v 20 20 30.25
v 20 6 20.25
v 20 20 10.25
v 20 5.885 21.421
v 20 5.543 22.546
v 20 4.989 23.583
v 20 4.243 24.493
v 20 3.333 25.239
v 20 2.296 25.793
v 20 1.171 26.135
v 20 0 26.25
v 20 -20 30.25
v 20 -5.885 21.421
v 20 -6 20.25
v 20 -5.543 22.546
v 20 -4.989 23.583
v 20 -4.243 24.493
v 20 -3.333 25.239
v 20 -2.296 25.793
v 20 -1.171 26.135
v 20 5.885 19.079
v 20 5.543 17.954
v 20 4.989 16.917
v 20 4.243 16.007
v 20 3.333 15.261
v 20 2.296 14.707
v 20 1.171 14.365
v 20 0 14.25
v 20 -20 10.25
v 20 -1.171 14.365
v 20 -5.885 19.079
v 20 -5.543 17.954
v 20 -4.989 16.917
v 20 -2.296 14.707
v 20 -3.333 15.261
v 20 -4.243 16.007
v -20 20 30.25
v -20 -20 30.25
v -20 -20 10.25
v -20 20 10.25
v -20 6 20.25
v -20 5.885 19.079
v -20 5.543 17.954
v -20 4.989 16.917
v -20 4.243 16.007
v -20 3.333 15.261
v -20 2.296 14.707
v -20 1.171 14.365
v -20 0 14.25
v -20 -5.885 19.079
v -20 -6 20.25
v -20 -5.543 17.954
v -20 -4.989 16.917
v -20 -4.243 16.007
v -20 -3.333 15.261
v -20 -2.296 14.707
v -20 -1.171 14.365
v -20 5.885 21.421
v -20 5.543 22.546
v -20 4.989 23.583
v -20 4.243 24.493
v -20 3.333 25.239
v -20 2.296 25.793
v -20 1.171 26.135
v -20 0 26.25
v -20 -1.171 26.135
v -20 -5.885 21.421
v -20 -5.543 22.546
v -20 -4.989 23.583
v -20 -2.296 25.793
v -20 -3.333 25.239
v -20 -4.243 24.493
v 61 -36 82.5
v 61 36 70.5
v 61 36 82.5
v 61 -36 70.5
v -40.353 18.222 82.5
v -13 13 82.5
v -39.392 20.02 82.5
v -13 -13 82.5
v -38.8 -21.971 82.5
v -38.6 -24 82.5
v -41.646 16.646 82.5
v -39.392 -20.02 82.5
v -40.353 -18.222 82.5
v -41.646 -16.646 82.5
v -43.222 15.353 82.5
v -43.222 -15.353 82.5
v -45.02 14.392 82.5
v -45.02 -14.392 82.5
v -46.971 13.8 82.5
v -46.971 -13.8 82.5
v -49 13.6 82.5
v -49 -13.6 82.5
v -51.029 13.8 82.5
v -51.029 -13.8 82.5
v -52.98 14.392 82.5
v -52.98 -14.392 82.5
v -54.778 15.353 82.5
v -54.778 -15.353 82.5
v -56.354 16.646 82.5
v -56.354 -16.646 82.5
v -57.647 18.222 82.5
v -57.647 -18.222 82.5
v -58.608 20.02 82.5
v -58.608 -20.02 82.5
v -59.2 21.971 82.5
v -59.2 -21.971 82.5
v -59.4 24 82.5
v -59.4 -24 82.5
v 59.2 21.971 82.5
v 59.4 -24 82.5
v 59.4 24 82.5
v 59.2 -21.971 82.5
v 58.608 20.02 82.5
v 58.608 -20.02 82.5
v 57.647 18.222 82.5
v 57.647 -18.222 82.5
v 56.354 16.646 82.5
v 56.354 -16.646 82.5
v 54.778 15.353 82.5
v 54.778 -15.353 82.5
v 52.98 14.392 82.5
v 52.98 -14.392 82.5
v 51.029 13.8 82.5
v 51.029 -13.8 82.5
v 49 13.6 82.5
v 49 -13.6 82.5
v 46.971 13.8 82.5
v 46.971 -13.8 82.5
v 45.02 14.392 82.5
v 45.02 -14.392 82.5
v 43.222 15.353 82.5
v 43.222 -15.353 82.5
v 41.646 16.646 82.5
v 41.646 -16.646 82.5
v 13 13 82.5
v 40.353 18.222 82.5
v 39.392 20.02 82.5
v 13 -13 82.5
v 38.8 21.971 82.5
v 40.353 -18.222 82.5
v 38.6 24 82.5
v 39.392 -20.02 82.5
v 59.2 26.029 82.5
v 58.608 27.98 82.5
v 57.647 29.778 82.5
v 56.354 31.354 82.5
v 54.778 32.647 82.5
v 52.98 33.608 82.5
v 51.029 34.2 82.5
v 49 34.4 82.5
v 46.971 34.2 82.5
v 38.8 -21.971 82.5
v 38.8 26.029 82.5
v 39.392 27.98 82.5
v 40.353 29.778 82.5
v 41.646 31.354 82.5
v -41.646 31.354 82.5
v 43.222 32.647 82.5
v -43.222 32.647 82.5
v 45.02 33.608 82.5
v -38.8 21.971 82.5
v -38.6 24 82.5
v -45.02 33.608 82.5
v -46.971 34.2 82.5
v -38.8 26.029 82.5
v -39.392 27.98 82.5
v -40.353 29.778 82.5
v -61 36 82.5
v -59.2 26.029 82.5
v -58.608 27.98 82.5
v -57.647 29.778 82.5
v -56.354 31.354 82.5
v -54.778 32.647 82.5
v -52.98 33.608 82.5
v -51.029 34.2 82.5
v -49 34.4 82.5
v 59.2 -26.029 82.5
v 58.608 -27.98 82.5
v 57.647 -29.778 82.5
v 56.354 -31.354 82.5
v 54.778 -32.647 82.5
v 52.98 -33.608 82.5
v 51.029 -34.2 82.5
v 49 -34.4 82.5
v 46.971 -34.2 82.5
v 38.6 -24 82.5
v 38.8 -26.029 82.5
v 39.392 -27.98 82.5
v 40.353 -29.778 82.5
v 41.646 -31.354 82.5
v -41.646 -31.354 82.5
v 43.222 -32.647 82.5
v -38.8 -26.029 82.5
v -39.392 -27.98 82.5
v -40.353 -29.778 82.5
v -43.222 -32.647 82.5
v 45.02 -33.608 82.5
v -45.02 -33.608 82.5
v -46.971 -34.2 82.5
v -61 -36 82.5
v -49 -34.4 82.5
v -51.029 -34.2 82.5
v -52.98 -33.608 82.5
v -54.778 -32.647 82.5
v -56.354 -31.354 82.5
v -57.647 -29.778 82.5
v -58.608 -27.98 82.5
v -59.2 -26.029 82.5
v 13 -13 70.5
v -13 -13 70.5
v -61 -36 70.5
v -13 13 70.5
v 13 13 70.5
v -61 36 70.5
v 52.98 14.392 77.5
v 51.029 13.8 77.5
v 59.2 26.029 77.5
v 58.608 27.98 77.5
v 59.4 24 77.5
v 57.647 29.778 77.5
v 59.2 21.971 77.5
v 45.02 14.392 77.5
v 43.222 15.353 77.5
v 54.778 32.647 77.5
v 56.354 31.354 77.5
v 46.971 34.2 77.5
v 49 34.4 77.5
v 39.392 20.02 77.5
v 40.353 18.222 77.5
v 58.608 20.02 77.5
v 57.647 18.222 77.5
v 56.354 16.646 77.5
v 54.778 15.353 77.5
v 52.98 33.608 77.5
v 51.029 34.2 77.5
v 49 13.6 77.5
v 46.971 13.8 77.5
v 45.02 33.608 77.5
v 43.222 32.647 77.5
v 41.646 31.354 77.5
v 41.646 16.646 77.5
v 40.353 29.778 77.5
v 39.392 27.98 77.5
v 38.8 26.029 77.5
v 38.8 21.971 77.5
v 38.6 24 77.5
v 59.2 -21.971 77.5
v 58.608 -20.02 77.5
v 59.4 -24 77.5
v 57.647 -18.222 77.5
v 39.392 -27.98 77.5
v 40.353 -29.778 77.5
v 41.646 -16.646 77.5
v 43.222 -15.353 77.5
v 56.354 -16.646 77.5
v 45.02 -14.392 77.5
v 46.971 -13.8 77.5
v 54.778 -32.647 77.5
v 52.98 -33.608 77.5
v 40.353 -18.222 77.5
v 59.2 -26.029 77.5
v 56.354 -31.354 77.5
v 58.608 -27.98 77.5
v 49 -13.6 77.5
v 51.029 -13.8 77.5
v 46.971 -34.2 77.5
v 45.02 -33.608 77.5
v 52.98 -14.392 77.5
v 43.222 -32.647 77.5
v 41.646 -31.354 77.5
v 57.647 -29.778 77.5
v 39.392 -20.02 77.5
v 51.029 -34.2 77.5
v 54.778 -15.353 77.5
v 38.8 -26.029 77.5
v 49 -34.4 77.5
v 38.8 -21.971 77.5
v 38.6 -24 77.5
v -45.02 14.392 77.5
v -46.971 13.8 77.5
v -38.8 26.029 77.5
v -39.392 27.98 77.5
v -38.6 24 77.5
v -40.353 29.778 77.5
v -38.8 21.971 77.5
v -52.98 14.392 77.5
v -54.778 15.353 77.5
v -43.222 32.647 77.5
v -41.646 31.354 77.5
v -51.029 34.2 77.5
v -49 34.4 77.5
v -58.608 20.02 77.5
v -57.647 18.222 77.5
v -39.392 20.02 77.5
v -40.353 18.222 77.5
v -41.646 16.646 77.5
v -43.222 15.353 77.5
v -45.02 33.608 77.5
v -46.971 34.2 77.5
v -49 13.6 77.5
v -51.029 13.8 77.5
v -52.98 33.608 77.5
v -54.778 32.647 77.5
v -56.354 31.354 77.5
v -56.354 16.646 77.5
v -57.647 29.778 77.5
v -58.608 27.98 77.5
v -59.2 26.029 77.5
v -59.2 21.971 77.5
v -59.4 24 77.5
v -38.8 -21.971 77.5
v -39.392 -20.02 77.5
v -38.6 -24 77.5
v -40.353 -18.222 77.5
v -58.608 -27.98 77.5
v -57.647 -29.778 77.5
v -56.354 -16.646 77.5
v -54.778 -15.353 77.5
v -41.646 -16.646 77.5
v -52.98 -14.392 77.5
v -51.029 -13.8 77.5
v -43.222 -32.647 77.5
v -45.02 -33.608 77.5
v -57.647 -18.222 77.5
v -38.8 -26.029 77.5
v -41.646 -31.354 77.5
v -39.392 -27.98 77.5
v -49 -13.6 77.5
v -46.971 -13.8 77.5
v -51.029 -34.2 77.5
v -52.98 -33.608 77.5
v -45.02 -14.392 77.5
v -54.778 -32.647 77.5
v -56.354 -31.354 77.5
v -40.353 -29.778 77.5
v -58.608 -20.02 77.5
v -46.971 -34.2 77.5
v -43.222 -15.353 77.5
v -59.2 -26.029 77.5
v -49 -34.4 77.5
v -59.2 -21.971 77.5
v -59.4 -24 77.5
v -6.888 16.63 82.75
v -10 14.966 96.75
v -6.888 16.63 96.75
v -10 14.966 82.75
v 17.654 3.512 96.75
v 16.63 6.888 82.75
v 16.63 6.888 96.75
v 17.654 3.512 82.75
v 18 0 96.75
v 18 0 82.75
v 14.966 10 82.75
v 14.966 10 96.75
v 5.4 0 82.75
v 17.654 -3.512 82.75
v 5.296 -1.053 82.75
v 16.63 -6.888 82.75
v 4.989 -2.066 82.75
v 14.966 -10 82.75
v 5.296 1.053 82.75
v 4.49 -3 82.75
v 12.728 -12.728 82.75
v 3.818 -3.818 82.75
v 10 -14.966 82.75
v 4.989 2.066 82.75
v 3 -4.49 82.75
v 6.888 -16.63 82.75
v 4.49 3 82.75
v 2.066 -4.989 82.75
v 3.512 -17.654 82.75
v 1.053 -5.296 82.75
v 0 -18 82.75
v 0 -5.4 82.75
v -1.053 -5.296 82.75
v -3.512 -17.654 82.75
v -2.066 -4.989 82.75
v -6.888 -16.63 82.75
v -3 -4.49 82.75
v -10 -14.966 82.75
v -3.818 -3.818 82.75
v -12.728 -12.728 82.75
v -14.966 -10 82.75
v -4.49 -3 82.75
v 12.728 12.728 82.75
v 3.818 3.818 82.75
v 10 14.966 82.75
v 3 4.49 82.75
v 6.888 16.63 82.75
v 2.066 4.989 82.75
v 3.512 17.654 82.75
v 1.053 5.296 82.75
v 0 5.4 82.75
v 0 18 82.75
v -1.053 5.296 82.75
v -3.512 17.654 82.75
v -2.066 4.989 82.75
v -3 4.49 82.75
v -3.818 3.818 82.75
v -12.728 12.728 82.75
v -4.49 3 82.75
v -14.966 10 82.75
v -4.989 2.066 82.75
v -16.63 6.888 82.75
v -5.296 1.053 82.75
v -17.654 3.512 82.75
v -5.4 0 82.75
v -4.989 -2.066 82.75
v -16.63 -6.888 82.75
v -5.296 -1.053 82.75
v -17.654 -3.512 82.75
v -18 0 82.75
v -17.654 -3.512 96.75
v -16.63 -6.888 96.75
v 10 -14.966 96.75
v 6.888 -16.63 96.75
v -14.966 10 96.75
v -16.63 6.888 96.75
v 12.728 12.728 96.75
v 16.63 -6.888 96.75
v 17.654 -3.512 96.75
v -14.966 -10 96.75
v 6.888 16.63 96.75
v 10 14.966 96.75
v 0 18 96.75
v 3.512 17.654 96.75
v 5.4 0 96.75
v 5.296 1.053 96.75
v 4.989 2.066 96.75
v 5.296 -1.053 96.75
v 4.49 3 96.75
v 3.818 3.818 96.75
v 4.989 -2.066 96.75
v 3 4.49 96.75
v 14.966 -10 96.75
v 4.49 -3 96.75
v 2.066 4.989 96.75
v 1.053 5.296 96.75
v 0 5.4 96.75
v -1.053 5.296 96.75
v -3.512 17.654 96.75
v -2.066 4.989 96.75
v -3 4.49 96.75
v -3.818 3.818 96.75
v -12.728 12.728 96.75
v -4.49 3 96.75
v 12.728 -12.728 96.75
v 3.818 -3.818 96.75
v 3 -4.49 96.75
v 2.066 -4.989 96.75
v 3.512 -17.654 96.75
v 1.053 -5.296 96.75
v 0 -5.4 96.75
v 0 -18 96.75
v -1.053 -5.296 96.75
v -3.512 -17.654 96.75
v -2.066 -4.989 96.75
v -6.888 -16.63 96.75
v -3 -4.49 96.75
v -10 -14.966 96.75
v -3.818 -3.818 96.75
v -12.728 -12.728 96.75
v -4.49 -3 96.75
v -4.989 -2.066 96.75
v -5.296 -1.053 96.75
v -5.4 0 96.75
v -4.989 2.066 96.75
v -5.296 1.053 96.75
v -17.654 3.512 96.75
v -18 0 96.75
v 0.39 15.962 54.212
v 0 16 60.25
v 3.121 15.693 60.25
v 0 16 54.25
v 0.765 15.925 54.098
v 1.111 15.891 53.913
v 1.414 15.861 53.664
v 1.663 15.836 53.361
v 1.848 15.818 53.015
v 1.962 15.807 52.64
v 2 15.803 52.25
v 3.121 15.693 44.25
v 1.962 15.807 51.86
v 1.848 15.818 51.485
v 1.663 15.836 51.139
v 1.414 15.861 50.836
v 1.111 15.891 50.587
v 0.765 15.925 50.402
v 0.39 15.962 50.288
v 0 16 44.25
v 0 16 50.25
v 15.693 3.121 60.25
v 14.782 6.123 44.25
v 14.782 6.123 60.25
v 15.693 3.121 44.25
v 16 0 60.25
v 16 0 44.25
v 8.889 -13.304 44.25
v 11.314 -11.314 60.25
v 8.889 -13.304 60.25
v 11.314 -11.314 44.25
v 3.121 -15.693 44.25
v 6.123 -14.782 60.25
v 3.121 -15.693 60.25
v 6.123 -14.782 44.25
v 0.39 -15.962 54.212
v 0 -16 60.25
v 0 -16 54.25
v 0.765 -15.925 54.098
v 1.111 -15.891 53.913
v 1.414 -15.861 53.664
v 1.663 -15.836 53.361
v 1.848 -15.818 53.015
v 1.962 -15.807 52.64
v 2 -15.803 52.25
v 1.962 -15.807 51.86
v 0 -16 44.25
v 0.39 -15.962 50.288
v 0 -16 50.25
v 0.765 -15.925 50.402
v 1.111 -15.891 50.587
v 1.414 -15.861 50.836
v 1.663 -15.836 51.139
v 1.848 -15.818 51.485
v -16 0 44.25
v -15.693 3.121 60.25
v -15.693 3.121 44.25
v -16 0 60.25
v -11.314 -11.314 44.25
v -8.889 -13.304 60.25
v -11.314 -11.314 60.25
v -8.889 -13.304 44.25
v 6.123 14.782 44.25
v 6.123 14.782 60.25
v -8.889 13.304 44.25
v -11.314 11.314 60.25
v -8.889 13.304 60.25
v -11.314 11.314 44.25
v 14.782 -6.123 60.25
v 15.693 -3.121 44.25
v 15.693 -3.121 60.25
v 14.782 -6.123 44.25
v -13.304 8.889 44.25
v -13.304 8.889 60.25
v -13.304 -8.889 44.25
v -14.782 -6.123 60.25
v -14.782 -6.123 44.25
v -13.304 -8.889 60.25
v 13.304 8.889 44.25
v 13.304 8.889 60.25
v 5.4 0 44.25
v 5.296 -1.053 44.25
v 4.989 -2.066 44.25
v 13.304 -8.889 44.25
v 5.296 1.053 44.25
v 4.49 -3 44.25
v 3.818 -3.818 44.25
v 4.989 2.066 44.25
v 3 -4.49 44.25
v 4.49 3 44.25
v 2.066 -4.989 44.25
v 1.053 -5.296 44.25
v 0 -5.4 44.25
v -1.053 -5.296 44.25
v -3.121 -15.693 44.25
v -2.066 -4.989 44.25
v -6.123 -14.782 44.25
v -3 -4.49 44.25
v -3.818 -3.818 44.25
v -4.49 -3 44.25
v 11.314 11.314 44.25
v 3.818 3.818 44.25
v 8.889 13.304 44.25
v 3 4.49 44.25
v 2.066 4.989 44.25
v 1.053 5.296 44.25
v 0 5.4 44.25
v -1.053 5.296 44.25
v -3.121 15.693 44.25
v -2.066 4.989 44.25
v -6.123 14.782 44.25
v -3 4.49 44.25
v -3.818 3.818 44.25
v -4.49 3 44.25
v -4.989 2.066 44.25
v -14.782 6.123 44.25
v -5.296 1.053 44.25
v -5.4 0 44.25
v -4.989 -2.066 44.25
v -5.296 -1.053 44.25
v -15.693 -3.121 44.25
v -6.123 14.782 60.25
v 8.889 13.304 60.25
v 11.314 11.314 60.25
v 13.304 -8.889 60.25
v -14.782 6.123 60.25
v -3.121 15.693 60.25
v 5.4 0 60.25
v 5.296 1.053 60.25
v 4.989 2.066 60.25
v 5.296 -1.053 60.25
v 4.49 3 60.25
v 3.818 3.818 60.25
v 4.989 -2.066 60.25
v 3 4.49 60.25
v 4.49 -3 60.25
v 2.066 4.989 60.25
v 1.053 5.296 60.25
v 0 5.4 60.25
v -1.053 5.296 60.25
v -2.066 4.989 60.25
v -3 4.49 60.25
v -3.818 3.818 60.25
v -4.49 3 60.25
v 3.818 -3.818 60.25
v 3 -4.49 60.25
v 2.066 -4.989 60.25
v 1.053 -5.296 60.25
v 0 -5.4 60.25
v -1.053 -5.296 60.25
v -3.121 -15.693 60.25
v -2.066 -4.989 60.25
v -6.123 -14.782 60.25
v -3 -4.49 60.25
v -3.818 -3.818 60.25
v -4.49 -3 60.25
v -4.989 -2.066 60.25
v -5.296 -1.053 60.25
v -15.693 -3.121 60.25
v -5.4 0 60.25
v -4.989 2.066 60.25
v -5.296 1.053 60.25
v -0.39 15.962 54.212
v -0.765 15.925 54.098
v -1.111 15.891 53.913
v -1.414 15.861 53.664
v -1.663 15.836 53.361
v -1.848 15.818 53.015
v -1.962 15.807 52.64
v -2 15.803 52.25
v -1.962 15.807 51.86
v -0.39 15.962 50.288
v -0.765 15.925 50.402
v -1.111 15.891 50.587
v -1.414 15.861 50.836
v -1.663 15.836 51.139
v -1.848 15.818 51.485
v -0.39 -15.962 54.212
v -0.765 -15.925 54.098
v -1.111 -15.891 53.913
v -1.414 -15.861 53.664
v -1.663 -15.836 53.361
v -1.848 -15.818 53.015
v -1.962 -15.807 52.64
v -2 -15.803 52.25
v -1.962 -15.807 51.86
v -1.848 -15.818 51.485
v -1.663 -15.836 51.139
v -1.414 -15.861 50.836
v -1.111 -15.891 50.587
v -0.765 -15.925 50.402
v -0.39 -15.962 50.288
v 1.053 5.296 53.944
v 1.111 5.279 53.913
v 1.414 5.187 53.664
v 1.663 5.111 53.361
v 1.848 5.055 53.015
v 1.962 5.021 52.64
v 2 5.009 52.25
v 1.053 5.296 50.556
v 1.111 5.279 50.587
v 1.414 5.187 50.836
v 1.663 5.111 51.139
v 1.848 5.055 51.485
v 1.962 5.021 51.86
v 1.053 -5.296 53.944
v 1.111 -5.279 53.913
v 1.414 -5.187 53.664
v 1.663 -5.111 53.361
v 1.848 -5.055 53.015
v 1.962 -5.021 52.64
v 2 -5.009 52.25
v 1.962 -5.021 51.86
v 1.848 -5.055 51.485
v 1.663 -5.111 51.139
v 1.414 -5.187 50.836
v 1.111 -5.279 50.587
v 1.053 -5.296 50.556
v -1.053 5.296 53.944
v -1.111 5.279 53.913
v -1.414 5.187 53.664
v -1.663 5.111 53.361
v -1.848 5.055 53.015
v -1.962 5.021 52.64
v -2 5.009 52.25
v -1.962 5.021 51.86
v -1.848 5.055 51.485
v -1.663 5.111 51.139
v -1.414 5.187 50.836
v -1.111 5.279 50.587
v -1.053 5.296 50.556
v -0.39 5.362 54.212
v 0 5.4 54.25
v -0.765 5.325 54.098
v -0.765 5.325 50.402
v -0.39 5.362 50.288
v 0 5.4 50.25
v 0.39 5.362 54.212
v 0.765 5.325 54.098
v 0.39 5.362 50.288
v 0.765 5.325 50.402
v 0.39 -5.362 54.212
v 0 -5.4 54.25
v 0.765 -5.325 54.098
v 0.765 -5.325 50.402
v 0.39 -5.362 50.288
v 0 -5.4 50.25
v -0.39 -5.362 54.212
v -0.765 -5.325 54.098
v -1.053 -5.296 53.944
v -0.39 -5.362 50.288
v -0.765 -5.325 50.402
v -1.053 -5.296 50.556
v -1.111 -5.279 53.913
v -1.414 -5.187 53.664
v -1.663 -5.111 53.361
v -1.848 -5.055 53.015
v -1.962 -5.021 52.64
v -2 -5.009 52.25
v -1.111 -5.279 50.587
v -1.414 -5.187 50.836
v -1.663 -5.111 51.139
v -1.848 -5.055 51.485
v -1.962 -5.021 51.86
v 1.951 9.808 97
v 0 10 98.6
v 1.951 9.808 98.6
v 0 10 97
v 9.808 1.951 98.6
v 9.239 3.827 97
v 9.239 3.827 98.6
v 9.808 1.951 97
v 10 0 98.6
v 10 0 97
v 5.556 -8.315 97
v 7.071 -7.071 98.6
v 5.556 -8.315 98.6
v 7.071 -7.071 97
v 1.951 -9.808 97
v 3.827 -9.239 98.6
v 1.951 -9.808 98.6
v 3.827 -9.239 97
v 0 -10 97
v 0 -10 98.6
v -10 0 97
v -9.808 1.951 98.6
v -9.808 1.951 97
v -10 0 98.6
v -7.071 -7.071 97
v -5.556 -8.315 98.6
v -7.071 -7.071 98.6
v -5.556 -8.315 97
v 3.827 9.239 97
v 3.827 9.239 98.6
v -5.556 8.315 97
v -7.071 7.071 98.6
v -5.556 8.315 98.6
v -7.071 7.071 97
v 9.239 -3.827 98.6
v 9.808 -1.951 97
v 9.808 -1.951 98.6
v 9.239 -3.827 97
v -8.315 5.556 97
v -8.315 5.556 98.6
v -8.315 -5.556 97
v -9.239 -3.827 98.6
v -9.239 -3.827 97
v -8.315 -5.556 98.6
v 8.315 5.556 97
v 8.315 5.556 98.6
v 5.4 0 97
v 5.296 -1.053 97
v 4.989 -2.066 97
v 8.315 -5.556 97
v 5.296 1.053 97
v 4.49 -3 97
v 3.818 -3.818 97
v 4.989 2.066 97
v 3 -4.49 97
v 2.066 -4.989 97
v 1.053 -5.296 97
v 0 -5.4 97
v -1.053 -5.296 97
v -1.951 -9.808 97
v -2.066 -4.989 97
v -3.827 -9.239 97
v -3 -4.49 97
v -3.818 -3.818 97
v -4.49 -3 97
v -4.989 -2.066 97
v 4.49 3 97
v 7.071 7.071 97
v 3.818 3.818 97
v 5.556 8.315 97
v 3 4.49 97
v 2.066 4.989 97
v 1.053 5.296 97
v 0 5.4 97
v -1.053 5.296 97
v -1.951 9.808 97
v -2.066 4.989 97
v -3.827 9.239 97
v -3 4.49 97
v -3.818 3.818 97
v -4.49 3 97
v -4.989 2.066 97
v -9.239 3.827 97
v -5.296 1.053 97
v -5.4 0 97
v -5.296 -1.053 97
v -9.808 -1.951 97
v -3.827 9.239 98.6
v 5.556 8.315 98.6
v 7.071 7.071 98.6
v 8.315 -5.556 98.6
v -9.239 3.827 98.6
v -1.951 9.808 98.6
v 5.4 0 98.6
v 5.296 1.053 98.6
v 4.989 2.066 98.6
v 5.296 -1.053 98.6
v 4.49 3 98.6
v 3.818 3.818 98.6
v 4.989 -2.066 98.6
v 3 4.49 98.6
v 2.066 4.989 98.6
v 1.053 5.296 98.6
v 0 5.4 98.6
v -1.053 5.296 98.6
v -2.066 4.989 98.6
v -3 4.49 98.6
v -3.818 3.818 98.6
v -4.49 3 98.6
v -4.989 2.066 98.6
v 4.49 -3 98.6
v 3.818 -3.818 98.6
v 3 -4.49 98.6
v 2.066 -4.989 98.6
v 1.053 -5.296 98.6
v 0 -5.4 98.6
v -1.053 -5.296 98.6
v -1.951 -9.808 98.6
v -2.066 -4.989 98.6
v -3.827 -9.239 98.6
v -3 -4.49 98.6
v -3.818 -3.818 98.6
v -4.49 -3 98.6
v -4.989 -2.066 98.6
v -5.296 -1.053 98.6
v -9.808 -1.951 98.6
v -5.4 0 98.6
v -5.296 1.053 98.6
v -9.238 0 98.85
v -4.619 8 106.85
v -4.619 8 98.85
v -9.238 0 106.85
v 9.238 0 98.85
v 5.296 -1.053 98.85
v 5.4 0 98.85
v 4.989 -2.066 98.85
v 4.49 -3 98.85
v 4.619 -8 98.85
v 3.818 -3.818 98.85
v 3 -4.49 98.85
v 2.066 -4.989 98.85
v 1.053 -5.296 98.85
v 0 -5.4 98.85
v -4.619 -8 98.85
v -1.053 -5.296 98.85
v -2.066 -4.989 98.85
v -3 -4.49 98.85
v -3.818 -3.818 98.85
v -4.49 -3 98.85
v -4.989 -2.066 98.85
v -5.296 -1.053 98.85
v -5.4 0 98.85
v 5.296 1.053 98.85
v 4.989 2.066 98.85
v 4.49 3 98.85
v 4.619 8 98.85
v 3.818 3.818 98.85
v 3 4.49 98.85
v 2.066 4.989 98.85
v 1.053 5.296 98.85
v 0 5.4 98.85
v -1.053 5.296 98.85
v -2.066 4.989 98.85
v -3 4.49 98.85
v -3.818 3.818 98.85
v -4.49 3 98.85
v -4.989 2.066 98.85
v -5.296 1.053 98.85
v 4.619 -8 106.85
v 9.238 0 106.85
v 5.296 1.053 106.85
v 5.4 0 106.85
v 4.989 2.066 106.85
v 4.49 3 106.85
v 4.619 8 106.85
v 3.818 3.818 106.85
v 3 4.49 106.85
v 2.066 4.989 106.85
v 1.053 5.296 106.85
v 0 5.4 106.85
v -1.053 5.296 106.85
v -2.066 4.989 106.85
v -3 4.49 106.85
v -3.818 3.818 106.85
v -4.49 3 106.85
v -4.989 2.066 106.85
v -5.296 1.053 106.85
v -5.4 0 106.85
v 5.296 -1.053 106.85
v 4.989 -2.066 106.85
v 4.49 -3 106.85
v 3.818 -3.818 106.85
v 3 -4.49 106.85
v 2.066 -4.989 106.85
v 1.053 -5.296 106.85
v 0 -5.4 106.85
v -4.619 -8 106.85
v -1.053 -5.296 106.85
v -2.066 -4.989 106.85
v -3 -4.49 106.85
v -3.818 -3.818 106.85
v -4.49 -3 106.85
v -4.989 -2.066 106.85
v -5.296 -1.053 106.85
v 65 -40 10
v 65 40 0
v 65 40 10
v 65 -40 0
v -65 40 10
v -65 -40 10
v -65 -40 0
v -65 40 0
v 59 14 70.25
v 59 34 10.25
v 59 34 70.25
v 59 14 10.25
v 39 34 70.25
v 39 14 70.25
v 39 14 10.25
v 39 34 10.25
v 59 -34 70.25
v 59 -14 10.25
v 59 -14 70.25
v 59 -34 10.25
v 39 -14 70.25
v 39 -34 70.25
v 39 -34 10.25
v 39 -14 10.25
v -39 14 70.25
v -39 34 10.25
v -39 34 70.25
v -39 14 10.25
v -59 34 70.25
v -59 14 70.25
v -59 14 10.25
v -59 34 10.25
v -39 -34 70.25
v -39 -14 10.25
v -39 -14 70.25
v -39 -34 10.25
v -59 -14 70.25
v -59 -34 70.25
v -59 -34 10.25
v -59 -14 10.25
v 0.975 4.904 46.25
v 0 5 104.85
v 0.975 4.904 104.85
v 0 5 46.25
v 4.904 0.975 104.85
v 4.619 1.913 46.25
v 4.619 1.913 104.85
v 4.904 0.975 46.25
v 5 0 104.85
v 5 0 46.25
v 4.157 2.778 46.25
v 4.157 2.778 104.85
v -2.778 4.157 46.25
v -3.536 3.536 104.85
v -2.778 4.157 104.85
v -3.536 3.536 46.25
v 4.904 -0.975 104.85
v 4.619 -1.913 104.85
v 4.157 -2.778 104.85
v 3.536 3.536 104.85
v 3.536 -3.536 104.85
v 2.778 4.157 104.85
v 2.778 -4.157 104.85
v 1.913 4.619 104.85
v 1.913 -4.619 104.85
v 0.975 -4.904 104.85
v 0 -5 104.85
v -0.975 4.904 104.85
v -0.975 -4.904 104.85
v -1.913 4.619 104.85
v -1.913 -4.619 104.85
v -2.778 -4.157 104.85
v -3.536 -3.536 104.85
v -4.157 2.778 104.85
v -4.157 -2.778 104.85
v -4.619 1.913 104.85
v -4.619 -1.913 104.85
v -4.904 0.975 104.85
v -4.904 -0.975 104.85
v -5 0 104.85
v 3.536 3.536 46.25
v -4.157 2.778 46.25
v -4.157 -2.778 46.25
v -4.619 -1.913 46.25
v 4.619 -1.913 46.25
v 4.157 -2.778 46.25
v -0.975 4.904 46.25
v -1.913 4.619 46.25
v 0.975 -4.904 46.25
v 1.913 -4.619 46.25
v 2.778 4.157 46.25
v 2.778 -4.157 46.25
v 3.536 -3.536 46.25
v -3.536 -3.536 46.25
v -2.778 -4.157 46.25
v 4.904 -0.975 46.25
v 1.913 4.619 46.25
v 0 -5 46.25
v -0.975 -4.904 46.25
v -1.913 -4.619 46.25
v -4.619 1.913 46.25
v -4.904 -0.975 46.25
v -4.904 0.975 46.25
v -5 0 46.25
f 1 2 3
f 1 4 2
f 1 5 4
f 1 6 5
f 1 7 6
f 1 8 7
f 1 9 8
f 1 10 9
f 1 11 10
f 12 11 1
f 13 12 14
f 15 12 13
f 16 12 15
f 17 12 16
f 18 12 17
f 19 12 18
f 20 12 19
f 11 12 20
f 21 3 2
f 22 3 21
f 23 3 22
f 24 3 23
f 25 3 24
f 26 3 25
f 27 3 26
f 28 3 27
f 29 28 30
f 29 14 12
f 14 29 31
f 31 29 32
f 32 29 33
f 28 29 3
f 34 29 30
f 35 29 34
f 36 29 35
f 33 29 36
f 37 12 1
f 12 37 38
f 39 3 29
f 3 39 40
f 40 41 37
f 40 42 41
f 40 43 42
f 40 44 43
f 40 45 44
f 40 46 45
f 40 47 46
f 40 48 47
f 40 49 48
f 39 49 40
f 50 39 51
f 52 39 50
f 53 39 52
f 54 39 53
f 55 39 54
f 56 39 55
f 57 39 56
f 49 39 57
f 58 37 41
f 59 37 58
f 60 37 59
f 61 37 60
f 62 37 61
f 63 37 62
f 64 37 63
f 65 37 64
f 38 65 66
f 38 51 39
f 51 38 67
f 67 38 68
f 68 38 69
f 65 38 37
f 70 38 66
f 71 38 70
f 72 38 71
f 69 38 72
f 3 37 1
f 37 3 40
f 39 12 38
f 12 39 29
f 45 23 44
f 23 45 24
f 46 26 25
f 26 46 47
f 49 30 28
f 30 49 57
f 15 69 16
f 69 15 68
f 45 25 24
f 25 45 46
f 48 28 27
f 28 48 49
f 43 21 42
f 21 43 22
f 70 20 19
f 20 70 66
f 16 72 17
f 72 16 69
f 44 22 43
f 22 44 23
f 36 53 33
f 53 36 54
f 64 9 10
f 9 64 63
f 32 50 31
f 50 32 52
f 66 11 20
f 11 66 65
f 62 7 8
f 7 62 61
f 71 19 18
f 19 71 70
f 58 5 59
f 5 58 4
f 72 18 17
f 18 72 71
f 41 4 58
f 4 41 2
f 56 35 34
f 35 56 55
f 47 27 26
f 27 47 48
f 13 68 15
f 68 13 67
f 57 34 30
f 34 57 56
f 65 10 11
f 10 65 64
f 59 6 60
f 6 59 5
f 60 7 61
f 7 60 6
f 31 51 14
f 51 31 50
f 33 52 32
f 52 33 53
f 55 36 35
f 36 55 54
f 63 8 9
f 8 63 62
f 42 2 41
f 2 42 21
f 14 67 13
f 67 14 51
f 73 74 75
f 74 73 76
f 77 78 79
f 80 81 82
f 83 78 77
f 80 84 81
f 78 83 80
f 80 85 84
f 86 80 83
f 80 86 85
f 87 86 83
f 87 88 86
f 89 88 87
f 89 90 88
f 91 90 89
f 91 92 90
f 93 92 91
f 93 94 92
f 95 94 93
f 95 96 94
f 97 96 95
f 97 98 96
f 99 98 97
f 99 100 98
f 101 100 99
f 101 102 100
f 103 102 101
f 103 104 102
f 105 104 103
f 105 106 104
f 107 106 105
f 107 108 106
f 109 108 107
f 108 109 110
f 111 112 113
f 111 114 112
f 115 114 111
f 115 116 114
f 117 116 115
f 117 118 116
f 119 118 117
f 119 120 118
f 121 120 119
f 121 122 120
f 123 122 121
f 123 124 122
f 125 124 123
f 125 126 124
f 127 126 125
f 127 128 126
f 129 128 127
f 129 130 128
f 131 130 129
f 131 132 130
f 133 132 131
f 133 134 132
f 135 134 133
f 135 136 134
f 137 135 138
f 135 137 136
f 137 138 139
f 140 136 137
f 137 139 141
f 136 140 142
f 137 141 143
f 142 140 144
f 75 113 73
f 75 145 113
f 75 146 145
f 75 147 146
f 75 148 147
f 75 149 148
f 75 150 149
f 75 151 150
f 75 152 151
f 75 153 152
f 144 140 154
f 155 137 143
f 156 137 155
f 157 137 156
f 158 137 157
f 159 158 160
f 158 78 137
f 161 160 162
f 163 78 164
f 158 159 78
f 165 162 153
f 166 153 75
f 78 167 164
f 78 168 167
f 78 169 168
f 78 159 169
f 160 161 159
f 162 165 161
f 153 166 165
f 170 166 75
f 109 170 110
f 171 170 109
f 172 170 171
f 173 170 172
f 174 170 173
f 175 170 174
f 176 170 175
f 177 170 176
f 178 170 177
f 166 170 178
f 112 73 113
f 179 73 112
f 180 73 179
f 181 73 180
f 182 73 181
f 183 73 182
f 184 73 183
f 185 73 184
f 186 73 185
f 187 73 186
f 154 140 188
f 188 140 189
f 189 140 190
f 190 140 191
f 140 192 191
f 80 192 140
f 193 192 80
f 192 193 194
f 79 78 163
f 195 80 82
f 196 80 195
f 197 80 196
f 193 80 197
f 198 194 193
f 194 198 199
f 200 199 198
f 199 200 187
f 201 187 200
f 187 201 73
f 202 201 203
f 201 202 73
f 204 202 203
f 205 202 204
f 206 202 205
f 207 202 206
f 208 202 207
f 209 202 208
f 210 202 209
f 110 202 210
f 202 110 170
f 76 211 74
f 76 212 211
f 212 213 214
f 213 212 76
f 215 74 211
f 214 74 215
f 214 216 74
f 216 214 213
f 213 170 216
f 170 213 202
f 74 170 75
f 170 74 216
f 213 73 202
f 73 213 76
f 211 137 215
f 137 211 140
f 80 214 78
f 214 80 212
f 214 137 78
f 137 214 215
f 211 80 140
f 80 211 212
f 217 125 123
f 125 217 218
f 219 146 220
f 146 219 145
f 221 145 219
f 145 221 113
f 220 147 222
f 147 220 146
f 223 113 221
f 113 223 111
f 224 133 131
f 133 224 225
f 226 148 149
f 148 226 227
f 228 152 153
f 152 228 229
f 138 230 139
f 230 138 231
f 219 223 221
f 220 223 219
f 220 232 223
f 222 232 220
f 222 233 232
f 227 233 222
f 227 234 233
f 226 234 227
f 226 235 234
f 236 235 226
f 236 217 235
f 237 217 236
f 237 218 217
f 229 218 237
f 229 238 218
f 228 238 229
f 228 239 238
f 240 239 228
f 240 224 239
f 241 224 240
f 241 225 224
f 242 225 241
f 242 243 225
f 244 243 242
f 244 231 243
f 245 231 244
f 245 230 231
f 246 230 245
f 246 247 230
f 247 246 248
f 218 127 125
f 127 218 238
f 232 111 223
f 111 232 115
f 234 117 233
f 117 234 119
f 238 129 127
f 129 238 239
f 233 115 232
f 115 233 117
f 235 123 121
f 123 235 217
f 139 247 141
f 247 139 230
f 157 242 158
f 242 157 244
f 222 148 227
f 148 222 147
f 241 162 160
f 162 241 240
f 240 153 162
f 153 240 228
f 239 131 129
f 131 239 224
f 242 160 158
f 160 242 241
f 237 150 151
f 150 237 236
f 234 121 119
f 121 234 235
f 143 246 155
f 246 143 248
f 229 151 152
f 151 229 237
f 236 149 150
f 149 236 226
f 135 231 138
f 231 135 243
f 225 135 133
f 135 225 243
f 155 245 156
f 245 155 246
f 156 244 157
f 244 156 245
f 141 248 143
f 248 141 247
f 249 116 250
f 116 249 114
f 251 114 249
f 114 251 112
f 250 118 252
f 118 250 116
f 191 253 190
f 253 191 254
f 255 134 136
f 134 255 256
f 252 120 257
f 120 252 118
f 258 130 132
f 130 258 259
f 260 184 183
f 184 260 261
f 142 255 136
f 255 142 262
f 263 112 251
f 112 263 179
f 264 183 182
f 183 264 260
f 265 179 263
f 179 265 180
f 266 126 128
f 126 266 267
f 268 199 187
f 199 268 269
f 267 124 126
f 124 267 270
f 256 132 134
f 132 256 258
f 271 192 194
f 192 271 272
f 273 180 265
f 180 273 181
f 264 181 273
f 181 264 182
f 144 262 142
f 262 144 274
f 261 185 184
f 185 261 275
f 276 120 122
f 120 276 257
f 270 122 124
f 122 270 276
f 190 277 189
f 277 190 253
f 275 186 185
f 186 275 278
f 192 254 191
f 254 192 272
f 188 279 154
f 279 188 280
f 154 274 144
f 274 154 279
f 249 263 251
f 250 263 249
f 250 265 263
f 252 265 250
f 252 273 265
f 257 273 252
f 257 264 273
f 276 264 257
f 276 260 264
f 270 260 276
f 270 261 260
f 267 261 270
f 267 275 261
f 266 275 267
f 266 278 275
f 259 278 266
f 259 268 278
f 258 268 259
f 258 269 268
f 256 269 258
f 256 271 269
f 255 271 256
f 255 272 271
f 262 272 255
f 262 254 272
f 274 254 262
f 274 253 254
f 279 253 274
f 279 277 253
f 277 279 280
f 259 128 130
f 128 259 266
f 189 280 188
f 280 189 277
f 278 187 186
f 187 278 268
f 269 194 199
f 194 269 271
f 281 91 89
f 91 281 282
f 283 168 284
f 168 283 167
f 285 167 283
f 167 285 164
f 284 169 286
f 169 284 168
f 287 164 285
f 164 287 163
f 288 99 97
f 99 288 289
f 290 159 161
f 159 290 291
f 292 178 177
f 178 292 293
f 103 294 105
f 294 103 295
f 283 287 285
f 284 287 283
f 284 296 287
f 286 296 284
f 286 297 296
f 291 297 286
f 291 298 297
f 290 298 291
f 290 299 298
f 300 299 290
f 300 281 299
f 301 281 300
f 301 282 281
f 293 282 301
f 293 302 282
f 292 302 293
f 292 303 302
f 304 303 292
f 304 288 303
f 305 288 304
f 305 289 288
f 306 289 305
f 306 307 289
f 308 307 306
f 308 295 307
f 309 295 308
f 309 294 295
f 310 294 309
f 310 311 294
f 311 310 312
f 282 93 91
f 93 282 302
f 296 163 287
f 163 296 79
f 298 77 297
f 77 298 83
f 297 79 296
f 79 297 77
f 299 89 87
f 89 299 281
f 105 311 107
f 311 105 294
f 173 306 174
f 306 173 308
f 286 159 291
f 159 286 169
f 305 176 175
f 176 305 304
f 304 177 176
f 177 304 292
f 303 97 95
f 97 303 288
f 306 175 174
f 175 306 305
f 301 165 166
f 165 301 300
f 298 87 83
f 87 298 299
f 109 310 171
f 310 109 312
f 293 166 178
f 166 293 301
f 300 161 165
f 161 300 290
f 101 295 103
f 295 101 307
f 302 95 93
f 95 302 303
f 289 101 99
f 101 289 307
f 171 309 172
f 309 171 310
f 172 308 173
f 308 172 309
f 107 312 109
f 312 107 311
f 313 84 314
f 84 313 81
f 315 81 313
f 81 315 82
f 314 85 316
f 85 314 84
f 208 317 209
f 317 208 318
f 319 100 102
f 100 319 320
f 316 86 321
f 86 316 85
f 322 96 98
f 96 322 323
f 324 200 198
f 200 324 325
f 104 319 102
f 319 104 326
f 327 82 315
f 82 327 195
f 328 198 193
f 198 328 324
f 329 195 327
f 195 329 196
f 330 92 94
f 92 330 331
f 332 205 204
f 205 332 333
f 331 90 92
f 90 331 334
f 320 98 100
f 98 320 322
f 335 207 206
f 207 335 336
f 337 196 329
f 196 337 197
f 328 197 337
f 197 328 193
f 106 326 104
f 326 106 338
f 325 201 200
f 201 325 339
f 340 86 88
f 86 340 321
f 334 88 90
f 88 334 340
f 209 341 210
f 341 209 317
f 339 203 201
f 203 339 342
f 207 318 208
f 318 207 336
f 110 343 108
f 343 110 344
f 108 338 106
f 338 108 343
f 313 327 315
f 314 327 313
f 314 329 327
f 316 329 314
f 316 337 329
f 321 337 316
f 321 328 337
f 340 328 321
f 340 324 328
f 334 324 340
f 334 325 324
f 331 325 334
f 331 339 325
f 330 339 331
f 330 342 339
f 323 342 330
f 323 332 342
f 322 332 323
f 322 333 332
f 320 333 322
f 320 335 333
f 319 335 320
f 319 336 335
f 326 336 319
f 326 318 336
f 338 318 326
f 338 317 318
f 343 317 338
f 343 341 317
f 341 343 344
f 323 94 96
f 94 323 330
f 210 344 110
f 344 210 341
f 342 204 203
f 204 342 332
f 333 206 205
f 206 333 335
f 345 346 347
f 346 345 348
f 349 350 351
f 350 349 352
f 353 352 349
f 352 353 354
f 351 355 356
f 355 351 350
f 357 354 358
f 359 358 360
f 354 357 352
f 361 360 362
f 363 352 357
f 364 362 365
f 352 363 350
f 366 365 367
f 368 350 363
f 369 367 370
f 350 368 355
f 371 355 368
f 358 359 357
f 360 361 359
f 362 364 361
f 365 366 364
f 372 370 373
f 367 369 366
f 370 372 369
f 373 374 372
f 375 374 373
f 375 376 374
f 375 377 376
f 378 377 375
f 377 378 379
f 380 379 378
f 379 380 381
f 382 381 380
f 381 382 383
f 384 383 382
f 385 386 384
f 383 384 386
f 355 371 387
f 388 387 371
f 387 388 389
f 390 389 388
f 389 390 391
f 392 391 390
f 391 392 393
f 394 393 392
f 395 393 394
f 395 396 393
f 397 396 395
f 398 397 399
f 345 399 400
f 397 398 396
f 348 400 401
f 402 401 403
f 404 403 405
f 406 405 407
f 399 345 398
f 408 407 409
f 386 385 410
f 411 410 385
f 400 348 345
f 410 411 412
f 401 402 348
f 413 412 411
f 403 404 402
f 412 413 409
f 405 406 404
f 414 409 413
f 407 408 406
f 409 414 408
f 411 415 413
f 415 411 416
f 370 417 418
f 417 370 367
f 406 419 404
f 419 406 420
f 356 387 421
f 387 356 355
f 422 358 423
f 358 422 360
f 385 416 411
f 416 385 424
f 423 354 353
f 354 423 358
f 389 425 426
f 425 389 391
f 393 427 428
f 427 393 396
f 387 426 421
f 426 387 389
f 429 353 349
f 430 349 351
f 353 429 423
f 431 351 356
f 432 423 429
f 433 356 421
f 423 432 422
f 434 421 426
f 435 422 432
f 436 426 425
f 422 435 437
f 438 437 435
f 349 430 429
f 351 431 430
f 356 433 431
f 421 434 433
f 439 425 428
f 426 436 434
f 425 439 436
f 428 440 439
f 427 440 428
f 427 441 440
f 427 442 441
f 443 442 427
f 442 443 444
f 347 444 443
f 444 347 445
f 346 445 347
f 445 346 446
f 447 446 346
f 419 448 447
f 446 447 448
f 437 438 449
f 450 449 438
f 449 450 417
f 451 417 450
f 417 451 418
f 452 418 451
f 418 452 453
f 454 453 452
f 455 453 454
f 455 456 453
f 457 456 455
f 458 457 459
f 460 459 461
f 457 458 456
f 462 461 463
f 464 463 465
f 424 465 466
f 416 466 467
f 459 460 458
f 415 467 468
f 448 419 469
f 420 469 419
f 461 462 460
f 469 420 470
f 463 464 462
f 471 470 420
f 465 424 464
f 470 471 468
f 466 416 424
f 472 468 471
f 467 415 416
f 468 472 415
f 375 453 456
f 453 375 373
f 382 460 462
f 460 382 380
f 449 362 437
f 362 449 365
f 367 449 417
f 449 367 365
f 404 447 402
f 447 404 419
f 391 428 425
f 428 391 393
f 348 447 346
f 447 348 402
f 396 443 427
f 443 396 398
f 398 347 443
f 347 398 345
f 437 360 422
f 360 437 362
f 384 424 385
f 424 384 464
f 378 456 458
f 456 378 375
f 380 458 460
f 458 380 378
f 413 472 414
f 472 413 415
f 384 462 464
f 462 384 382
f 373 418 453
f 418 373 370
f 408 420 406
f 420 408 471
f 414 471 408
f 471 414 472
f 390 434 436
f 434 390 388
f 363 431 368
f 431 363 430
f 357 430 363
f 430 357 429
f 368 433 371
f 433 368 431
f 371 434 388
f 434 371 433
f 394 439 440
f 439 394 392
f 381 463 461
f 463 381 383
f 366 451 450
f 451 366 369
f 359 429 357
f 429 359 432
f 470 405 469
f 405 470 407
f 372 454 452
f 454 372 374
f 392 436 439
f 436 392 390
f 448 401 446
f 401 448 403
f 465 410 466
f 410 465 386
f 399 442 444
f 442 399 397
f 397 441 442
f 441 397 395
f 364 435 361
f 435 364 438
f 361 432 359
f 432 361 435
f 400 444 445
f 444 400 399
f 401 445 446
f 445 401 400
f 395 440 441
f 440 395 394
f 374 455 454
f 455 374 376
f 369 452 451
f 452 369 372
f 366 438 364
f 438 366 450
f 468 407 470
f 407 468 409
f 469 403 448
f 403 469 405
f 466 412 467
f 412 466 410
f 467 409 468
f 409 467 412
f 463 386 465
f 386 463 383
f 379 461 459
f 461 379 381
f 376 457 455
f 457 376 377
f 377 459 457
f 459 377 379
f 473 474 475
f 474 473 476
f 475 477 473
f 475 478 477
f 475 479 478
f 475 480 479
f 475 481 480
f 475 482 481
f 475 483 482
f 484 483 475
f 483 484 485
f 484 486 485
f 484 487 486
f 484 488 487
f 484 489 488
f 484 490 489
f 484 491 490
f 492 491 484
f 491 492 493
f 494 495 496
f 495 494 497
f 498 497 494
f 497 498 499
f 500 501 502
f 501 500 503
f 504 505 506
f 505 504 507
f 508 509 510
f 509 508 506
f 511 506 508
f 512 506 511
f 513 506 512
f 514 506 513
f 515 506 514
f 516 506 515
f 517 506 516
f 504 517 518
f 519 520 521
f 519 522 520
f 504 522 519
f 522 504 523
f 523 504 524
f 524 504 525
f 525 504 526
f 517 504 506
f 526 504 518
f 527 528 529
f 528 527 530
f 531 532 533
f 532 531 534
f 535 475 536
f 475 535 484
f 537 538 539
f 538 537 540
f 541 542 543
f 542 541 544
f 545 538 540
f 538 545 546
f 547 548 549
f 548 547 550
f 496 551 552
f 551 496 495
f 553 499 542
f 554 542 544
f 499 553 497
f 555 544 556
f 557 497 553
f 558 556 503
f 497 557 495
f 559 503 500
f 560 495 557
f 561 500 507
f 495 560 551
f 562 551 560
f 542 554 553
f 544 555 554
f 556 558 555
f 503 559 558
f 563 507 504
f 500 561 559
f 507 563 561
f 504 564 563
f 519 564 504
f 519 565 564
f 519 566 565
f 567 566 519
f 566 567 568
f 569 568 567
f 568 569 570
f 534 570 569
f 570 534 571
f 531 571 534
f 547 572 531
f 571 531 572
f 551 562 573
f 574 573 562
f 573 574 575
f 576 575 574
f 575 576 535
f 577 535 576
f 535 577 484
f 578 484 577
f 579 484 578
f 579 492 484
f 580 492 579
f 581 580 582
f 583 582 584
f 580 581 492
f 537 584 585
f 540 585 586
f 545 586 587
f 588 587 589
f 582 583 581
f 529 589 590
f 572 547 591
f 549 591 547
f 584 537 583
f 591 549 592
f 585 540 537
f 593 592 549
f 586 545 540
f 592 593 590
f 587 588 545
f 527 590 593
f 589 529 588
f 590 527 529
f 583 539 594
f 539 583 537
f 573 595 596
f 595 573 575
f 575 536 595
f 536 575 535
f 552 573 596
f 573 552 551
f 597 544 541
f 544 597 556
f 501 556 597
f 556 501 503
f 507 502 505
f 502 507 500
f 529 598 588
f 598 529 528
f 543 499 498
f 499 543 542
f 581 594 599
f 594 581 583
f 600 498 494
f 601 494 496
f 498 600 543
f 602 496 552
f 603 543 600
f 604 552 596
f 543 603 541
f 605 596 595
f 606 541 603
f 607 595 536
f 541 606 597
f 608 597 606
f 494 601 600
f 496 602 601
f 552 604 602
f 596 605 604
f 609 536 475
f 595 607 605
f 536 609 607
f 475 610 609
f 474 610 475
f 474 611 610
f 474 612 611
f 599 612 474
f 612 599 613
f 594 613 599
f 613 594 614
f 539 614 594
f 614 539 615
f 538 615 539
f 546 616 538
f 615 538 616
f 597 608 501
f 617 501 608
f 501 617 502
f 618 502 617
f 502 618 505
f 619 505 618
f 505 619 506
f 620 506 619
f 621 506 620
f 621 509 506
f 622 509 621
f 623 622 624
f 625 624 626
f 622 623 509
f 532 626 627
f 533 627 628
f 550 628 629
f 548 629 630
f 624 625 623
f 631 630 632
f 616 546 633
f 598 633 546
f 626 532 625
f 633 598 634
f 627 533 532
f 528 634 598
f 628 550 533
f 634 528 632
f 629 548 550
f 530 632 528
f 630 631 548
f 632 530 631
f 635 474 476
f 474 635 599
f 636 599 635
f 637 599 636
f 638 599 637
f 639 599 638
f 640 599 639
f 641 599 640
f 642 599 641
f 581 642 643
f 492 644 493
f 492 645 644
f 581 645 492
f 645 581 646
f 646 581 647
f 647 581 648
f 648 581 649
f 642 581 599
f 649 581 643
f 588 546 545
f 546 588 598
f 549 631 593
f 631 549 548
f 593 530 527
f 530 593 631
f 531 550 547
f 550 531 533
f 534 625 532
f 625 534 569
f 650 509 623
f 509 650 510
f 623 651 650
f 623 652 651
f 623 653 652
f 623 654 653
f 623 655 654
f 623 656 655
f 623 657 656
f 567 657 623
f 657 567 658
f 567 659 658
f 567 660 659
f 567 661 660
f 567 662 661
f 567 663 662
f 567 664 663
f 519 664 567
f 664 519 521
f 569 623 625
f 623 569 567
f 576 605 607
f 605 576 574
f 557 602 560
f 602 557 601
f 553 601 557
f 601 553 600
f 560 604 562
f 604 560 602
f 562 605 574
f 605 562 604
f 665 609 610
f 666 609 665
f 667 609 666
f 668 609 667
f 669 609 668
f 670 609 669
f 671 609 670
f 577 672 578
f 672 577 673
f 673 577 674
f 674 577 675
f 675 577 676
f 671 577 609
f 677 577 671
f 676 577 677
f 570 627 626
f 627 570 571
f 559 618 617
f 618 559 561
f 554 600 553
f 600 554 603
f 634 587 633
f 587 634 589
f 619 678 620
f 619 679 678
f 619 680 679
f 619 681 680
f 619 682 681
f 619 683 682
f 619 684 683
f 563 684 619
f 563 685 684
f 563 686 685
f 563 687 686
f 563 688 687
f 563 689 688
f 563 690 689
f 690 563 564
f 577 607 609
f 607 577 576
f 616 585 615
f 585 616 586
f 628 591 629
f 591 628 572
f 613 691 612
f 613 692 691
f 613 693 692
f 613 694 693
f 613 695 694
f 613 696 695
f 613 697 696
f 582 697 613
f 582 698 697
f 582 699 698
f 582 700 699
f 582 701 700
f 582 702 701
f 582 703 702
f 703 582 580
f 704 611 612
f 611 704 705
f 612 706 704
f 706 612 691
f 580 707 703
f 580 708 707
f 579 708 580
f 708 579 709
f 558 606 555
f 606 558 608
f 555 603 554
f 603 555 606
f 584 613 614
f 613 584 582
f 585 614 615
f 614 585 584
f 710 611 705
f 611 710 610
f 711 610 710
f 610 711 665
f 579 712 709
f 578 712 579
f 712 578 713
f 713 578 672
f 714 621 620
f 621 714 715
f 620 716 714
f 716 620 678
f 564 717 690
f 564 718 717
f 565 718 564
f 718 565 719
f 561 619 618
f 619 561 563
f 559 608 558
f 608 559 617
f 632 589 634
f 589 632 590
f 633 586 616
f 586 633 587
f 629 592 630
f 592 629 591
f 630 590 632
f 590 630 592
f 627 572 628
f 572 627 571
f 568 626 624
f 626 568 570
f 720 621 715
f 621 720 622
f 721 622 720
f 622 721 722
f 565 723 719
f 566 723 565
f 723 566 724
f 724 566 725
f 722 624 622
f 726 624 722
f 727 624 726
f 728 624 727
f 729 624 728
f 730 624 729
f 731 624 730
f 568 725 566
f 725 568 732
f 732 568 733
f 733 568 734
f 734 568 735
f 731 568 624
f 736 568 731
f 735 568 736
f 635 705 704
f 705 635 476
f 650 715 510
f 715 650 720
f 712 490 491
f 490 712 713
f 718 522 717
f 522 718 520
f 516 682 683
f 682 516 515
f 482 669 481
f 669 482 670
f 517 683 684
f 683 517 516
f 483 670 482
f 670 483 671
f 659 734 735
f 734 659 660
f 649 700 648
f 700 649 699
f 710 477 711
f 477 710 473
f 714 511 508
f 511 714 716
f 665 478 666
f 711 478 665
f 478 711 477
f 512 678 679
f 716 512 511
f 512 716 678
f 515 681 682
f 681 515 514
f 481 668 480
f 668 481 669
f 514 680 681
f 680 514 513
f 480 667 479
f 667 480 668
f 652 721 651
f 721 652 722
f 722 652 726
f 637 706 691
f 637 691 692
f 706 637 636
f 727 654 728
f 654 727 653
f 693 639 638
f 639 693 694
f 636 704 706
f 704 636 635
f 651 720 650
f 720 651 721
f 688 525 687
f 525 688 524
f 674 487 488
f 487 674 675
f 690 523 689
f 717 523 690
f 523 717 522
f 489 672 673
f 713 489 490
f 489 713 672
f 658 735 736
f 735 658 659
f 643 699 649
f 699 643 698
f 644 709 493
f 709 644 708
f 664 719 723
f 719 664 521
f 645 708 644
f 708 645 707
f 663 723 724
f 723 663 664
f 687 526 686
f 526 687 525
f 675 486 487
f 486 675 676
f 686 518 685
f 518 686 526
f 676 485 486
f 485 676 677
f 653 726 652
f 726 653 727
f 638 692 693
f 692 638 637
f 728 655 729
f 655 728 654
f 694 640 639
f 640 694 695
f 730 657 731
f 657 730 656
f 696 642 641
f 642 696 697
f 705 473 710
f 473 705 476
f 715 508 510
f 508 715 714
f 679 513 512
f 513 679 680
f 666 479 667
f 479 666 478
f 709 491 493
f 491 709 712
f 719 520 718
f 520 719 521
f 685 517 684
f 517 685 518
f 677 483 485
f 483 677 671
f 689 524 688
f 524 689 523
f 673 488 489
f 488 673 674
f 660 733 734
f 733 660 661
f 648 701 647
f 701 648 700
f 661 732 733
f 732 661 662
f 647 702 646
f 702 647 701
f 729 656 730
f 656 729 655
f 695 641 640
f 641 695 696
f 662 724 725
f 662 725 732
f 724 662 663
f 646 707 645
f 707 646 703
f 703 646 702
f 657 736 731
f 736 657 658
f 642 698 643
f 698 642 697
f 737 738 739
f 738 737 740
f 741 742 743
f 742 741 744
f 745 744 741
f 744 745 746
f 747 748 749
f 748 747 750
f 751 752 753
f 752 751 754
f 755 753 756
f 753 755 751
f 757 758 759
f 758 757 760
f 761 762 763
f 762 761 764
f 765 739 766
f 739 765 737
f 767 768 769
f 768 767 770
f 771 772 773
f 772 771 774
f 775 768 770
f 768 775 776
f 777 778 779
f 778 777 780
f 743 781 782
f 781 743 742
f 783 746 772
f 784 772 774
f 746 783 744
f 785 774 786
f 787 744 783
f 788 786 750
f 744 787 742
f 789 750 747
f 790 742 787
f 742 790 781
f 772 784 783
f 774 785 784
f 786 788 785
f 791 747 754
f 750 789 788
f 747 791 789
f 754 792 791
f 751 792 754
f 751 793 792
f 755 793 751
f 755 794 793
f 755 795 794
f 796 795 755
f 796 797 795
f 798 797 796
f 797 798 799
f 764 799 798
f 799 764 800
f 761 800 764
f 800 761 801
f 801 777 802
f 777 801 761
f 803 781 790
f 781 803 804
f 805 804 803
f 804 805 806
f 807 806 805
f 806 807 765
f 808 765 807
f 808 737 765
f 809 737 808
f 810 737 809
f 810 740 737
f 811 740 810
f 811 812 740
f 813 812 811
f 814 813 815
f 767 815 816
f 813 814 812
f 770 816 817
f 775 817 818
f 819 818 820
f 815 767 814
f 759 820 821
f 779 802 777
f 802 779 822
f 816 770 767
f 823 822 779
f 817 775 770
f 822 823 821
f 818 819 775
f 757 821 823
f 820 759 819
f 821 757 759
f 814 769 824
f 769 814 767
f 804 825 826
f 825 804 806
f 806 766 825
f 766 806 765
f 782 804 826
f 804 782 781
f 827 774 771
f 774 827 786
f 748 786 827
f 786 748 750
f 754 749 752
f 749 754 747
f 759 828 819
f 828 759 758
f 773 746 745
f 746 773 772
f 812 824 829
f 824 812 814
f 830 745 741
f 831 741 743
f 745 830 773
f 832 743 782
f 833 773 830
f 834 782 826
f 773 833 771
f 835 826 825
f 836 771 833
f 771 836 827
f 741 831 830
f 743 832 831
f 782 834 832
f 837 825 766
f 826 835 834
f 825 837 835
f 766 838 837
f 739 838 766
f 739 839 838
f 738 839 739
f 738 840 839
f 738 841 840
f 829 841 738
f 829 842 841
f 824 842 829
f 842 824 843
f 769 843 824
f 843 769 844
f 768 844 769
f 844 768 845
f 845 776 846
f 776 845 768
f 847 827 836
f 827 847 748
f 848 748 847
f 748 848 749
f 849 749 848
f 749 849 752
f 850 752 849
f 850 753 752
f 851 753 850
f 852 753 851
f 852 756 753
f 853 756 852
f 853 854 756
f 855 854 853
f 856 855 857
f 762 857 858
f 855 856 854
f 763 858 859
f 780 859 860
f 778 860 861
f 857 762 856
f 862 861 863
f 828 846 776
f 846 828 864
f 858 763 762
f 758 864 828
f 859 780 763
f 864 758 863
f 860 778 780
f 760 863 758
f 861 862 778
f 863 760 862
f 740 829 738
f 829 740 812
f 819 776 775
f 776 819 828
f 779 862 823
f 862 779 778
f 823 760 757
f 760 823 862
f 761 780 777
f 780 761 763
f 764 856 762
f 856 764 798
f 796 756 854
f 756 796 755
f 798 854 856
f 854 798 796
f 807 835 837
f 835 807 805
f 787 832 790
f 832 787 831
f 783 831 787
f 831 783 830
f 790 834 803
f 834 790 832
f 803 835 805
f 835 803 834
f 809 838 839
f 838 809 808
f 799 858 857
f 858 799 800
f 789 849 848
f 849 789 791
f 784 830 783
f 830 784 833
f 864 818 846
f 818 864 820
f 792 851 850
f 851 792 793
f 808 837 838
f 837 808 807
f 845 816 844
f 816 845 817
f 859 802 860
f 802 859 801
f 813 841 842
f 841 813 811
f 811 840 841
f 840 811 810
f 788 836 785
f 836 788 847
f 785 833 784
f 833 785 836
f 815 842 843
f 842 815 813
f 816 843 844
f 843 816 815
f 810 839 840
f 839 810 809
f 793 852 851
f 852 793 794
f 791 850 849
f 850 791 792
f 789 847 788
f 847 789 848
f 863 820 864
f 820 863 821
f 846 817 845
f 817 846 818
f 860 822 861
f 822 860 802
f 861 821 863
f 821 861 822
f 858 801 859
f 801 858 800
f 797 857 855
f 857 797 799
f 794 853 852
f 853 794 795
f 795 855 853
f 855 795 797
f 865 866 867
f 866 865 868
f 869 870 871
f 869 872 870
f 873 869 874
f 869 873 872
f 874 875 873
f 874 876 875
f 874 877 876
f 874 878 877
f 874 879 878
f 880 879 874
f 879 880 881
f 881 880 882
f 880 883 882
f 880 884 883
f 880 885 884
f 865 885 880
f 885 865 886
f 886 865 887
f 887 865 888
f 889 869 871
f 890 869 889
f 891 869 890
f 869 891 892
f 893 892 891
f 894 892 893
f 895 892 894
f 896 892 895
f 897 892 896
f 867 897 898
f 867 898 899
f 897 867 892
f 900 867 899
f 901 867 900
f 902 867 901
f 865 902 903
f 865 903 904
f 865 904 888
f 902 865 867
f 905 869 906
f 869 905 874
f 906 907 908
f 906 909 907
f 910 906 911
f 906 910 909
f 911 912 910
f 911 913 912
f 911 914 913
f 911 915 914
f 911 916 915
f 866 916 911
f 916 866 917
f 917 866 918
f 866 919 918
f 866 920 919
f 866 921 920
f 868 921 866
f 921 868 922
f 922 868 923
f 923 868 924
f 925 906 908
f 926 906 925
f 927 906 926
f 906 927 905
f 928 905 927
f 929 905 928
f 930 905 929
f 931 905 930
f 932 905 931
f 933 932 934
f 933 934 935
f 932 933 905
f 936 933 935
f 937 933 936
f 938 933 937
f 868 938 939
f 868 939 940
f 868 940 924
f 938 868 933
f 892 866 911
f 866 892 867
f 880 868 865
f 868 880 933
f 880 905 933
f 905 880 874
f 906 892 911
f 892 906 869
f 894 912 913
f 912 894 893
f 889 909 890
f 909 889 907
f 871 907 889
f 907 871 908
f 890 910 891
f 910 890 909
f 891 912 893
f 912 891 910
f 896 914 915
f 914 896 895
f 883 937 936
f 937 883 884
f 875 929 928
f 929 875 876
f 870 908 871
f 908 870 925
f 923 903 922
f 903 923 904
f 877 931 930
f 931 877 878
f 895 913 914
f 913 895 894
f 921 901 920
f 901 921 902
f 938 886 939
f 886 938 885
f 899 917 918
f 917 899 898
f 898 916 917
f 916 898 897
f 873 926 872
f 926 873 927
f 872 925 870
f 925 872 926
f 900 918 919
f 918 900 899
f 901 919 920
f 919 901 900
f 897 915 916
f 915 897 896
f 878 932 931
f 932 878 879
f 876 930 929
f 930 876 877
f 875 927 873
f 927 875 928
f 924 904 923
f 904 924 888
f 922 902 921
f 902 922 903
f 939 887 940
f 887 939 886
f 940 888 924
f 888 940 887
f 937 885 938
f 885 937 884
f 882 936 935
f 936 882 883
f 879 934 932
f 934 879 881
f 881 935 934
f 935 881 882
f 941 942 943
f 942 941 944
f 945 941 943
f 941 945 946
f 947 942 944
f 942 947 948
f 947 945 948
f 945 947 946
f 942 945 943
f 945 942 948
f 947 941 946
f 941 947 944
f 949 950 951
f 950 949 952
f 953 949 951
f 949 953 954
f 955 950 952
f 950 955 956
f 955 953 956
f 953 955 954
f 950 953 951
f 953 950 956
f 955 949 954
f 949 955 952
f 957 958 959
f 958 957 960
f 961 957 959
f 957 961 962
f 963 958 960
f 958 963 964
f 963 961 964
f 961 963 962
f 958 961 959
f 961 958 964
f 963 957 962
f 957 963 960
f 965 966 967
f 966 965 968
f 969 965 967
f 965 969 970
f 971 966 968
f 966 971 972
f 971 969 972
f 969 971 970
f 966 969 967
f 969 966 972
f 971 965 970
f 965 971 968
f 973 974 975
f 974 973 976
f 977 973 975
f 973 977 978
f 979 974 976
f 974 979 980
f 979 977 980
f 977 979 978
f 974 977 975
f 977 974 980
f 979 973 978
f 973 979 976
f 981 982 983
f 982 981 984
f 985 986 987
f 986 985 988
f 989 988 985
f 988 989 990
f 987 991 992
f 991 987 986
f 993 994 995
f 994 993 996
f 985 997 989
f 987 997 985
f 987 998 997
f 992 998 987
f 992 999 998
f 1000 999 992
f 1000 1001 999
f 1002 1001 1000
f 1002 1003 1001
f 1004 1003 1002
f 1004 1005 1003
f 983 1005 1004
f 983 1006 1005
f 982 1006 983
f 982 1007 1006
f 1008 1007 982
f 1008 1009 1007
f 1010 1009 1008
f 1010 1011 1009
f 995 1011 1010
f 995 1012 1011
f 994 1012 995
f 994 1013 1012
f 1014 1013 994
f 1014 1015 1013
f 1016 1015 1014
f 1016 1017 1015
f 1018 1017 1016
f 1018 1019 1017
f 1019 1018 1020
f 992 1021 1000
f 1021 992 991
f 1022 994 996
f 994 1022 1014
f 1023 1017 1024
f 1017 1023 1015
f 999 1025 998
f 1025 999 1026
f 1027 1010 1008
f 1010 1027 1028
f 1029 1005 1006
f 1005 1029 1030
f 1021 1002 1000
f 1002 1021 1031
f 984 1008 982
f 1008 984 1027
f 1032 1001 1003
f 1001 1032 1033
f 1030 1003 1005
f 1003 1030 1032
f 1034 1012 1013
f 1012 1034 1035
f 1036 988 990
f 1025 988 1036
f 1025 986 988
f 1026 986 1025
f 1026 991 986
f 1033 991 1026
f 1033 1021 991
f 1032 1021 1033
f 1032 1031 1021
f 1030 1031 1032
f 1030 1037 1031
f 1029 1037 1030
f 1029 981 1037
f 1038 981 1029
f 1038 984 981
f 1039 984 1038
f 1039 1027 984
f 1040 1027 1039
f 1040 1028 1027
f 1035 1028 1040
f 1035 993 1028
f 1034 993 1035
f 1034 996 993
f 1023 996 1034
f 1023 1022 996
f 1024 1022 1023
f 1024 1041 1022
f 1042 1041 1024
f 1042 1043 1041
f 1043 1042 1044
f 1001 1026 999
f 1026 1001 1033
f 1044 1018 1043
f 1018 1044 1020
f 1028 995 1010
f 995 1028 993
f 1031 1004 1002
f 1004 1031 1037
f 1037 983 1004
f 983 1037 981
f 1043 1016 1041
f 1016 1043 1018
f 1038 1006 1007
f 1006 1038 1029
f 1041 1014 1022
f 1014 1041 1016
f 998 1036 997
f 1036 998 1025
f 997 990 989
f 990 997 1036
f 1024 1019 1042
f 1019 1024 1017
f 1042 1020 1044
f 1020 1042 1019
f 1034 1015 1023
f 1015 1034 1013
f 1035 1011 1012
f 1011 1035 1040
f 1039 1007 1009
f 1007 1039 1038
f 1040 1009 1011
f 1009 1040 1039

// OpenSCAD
$fn = 32;

// ------------------------------------------------------------------------
// Arbor press fixture: screw d10, posts 60 mm, gap 14 mm
// Every part is its own module, assembly() places every instance.
// ------------------------------------------------------------------------

// --- part 1 ---
module press_bed() {
  difference() {
    translate([-65, -40, 0]) cube([130, 80, 10]);
  }
}

// --- part 2 ---
module anvil_block() {
  difference() {
    translate([-20, -20, 0]) cube([40, 40, 20]);
    translate([0, 0, 10]) rotate([0, 90, 0]) cylinder(h = 42, d = 12, center = true);
  }
}

// --- part 3 ---
module press_post_a() {
  translate([-10, -10, 0]) cube([20, 20, 60]);
}

// --- part 4 ---
module press_post_b() {
  translate([-10, -10, 0]) cube([20, 20, 60]);
}

// --- part 5 ---
module press_post_c() {
  translate([-10, -10, 0]) cube([20, 20, 60]);
}

// --- part 6 ---
module press_post_d() {
  translate([-10, -10, 0]) cube([20, 20, 60]);
}

// --- part 7 ---
module press_frame() {
  difference() {
    translate([-61, -36, 0]) cube([122, 72, 12]);
    translate([-13, -13, -1]) cube([26, 26, 14]);
    translate([49, 24, 7]) cylinder(h = 6, d = 20.8);
    translate([49, -24, 7]) cylinder(h = 6, d = 20.8);
    translate([-49, 24, 7]) cylinder(h = 6, d = 20.8);
    translate([-49, -24, 7]) cylinder(h = 6, d = 20.8);
  }
}

// --- part 8 ---
module guide_ring() {
  difference() {
      translate([0, 0, 0]) cylinder(h = 14, d = 36);
      translate([0, 0, -1]) cylinder(h = 16, d = 10.8);
    }
}

// --- part 9 ---
module press_screw() {
  translate([0, 0, -29.3]) cylinder(h = 58.6, d = 10);
}

// --- part 10 ---
module press_head() {
  difference() {
    cylinder(h = 16, d = 32);
    translate([0, 0, -1]) cylinder(h = 18, d = 10.8);
    translate([0, 0, 8]) rotate([90, 0, 0]) cylinder(h = 34, d = 4, center = true);
  }
}

// --- part 11 ---
module nut_washer() {
  difference() {
      translate([0, 0, 0]) cylinder(h = 1.6, d = 20);
      translate([0, 0, -1]) cylinder(h = 3.6, d = 10.8);
    }
}

// --- part 12 ---
module press_nut() {
  difference() {
    linear_extrude(height = 8) polygon(points = [[9.238, 0], [4.619, 8], [-4.619, 8], [-9.238, 0], [-4.619, -8], [4.619, -8]]);
    translate([0, 0, -1]) cylinder(h = 10, d = 10.8);
  }
}

// --- assembly ---
module assembly() {
  color([0.80, 0.24, 0.20]) translate([0, 0, 0]) rotate([0, 0, 0]) press_bed();
  color([0.20, 0.45, 0.75]) translate([0, 0, 10.25]) rotate([0, 0, 0]) anvil_block();
  color([0.25, 0.62, 0.32]) translate([49, 24, 10.25]) rotate([0, 0, 0]) press_post_a();
  color([0.92, 0.70, 0.18]) translate([49, -24, 10.25]) rotate([0, 0, 0]) press_post_b();
  color([0.58, 0.35, 0.70]) translate([-49, 24, 10.25]) rotate([0, 0, 0]) press_post_c();
  color([0.16, 0.66, 0.66]) translate([-49, -24, 10.25]) rotate([0, 0, 0]) press_post_d();
  color([0.85, 0.48, 0.18]) translate([0, 0, 70.5]) rotate([0, 0, 0]) press_frame();
  color([0.55, 0.60, 0.65]) translate([0, 0, 82.75]) rotate([0, 0, 0]) guide_ring();
  color([0.75, 0.30, 0.55]) translate([0, 0, 75.55]) rotate([0, 0, 0]) press_screw();
  color([0.42, 0.52, 0.28]) translate([0, 0, 44.25]) rotate([0, 0, 0]) press_head();
  color([0.80, 0.24, 0.20]) translate([0, 0, 97]) rotate([0, 0, 0]) nut_washer();
  color([0.20, 0.45, 0.75]) translate([0, 0, 98.85]) rotate([0, 0, 0]) press_nut();
}

assembly();
